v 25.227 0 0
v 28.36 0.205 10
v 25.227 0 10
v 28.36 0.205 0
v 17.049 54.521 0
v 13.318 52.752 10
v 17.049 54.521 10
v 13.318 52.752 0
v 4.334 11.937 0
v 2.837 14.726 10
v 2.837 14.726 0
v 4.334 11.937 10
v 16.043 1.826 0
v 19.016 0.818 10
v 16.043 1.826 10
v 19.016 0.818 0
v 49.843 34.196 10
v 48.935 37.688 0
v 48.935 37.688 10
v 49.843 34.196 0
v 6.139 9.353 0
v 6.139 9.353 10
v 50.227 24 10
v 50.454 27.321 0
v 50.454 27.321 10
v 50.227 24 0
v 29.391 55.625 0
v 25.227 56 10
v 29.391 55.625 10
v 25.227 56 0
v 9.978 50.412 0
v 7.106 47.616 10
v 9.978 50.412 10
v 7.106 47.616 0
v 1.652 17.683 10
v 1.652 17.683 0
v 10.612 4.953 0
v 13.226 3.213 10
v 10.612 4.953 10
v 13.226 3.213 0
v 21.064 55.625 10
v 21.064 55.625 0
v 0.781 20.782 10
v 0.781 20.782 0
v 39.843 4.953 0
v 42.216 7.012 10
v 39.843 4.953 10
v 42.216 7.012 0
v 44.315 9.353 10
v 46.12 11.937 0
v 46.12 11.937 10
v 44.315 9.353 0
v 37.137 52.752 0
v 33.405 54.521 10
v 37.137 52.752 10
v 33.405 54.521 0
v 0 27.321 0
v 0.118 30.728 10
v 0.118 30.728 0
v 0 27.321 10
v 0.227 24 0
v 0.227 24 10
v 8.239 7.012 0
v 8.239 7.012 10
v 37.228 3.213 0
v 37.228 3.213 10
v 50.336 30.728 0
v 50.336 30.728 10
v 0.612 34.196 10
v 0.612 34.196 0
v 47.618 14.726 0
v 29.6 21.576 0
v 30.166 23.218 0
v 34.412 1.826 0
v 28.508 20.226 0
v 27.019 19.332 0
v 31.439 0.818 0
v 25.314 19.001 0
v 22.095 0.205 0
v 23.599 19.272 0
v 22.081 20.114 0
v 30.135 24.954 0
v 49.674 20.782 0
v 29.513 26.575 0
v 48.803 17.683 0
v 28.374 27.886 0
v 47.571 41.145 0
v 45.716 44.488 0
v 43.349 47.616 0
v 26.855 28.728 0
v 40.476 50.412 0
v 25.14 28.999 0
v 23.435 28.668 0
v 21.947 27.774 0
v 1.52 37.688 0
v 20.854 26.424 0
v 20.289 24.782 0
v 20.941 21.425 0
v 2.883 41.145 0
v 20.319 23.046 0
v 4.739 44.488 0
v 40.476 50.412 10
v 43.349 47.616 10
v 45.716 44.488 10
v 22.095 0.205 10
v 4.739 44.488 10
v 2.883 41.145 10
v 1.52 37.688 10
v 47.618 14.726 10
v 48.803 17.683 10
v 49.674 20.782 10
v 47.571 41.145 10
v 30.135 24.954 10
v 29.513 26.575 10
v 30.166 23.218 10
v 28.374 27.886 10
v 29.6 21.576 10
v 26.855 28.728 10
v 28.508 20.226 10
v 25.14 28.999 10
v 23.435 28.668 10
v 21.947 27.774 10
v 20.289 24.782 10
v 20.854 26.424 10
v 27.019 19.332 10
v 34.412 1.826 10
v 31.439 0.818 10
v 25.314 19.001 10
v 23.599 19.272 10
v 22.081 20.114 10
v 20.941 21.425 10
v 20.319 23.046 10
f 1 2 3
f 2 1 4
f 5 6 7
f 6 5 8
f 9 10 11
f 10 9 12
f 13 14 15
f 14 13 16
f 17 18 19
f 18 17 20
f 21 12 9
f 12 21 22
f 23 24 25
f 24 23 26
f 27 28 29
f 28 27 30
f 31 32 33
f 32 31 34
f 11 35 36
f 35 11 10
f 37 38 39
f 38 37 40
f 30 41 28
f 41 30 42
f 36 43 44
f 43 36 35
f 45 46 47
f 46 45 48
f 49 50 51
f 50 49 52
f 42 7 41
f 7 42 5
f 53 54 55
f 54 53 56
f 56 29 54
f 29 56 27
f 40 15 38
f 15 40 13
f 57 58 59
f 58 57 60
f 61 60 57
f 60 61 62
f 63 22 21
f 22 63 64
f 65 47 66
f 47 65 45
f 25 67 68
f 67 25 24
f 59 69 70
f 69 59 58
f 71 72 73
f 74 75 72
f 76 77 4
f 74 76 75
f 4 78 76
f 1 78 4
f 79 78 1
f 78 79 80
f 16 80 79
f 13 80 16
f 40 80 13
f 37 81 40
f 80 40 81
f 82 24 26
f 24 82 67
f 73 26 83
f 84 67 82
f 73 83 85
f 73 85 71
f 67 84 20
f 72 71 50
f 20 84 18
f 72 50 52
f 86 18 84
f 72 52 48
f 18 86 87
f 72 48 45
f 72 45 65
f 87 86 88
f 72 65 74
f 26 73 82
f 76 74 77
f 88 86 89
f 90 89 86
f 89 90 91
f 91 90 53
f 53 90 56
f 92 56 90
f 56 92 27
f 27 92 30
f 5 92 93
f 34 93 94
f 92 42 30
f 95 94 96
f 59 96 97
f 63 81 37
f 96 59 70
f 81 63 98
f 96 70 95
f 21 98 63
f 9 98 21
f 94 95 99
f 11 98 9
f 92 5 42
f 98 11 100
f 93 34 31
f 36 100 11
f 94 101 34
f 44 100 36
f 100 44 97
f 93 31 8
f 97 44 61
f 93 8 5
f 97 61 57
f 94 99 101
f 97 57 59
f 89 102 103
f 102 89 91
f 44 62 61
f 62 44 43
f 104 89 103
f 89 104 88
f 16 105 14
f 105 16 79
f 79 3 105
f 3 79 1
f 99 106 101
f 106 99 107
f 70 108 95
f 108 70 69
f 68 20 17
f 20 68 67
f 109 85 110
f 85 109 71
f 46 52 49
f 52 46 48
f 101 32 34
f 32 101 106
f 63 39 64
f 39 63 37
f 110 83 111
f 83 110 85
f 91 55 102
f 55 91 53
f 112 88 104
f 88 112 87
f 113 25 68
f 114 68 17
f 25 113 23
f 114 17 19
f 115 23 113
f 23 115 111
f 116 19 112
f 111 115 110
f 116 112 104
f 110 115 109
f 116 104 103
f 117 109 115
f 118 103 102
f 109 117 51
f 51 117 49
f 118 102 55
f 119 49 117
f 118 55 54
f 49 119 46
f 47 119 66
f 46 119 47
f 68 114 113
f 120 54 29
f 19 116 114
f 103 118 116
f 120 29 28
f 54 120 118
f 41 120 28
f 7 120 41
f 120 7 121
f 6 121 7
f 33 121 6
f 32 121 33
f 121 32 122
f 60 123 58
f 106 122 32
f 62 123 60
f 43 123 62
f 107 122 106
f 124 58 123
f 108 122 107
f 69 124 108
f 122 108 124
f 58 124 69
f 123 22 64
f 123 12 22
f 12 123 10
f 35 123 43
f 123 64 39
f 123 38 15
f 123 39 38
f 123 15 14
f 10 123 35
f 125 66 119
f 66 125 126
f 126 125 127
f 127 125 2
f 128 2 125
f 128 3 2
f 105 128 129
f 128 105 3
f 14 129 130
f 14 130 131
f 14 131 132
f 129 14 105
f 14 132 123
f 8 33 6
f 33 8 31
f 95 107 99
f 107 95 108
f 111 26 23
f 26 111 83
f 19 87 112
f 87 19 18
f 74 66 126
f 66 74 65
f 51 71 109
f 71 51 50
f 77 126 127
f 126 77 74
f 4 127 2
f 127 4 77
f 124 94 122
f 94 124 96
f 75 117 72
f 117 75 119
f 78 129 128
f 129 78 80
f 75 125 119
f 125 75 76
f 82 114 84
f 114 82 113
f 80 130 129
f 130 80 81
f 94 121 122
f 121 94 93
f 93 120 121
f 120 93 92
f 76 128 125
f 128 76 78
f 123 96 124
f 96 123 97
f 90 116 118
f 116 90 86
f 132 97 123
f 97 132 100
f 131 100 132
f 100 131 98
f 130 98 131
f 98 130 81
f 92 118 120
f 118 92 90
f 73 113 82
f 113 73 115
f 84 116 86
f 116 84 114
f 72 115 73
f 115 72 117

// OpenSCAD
$fn = 32;

// ----------------------------------------------------------------------
// Cam plate: single_lobe cam, base R24
// ----------------------------------------------------------------------

// --- parameters (mm) ---
base_r = 24;              // base circle radius
lobe_h = 8;               // cam lobe rise
bore_r = 5;               // shaft bore radius
plate_t = 10;             // plate thickness, Z (extrusion height)

profile = [[50.227, 24], [50.454, 27.321], [50.336, 30.728], [49.843, 34.196], [48.935, 37.688], [47.571, 41.145], [45.716, 44.488], [43.349, 47.616], [40.476, 50.412], [37.137, 52.752], [33.405, 54.521], [29.391, 55.625], [25.227, 56], [21.064, 55.625], [17.049, 54.521], [13.318, 52.752], [9.978, 50.412], [7.106, 47.616], [4.739, 44.488], [2.883, 41.145], [1.52, 37.688], [0.612, 34.196], [0.118, 30.728], [0, 27.321], [0.227, 24], [0.781, 20.782], [1.652, 17.683], [2.837, 14.726], [4.334, 11.937], [6.139, 9.353], [8.239, 7.012], [10.612, 4.953], [13.226, 3.213], [16.043, 1.826], [19.016, 0.818], [22.095, 0.205], [25.227, 0], [28.36, 0.205], [31.439, 0.818], [34.412, 1.826], [37.228, 3.213], [39.843, 4.953], [42.216, 7.012], [44.315, 9.353], [46.12, 11.937], [47.618, 14.726], [48.803, 17.683], [49.674, 20.782]];  // primary outline, 48 points, counter clockwise
void_1 = [[30.135, 24.954], [29.513, 26.575], [28.374, 27.886], [26.855, 28.728], [25.14, 28.999], [23.435, 28.668], [21.947, 27.774], [20.854, 26.424], [20.289, 24.782], [20.319, 23.046], [20.941, 21.425], [22.081, 20.114], [23.599, 19.272], [25.314, 19.001], [27.019, 19.332], [28.508, 20.226], [29.6, 21.576], [30.166, 23.218]];  // shaft bore, 18 points

// --- the one profile operation ---
difference() {
  linear_extrude(height = plate_t) polygon(points = profile);
  translate([0, 0, -1])
    linear_extrude(height = plate_t + 2) polygon(points = void_1);
}
